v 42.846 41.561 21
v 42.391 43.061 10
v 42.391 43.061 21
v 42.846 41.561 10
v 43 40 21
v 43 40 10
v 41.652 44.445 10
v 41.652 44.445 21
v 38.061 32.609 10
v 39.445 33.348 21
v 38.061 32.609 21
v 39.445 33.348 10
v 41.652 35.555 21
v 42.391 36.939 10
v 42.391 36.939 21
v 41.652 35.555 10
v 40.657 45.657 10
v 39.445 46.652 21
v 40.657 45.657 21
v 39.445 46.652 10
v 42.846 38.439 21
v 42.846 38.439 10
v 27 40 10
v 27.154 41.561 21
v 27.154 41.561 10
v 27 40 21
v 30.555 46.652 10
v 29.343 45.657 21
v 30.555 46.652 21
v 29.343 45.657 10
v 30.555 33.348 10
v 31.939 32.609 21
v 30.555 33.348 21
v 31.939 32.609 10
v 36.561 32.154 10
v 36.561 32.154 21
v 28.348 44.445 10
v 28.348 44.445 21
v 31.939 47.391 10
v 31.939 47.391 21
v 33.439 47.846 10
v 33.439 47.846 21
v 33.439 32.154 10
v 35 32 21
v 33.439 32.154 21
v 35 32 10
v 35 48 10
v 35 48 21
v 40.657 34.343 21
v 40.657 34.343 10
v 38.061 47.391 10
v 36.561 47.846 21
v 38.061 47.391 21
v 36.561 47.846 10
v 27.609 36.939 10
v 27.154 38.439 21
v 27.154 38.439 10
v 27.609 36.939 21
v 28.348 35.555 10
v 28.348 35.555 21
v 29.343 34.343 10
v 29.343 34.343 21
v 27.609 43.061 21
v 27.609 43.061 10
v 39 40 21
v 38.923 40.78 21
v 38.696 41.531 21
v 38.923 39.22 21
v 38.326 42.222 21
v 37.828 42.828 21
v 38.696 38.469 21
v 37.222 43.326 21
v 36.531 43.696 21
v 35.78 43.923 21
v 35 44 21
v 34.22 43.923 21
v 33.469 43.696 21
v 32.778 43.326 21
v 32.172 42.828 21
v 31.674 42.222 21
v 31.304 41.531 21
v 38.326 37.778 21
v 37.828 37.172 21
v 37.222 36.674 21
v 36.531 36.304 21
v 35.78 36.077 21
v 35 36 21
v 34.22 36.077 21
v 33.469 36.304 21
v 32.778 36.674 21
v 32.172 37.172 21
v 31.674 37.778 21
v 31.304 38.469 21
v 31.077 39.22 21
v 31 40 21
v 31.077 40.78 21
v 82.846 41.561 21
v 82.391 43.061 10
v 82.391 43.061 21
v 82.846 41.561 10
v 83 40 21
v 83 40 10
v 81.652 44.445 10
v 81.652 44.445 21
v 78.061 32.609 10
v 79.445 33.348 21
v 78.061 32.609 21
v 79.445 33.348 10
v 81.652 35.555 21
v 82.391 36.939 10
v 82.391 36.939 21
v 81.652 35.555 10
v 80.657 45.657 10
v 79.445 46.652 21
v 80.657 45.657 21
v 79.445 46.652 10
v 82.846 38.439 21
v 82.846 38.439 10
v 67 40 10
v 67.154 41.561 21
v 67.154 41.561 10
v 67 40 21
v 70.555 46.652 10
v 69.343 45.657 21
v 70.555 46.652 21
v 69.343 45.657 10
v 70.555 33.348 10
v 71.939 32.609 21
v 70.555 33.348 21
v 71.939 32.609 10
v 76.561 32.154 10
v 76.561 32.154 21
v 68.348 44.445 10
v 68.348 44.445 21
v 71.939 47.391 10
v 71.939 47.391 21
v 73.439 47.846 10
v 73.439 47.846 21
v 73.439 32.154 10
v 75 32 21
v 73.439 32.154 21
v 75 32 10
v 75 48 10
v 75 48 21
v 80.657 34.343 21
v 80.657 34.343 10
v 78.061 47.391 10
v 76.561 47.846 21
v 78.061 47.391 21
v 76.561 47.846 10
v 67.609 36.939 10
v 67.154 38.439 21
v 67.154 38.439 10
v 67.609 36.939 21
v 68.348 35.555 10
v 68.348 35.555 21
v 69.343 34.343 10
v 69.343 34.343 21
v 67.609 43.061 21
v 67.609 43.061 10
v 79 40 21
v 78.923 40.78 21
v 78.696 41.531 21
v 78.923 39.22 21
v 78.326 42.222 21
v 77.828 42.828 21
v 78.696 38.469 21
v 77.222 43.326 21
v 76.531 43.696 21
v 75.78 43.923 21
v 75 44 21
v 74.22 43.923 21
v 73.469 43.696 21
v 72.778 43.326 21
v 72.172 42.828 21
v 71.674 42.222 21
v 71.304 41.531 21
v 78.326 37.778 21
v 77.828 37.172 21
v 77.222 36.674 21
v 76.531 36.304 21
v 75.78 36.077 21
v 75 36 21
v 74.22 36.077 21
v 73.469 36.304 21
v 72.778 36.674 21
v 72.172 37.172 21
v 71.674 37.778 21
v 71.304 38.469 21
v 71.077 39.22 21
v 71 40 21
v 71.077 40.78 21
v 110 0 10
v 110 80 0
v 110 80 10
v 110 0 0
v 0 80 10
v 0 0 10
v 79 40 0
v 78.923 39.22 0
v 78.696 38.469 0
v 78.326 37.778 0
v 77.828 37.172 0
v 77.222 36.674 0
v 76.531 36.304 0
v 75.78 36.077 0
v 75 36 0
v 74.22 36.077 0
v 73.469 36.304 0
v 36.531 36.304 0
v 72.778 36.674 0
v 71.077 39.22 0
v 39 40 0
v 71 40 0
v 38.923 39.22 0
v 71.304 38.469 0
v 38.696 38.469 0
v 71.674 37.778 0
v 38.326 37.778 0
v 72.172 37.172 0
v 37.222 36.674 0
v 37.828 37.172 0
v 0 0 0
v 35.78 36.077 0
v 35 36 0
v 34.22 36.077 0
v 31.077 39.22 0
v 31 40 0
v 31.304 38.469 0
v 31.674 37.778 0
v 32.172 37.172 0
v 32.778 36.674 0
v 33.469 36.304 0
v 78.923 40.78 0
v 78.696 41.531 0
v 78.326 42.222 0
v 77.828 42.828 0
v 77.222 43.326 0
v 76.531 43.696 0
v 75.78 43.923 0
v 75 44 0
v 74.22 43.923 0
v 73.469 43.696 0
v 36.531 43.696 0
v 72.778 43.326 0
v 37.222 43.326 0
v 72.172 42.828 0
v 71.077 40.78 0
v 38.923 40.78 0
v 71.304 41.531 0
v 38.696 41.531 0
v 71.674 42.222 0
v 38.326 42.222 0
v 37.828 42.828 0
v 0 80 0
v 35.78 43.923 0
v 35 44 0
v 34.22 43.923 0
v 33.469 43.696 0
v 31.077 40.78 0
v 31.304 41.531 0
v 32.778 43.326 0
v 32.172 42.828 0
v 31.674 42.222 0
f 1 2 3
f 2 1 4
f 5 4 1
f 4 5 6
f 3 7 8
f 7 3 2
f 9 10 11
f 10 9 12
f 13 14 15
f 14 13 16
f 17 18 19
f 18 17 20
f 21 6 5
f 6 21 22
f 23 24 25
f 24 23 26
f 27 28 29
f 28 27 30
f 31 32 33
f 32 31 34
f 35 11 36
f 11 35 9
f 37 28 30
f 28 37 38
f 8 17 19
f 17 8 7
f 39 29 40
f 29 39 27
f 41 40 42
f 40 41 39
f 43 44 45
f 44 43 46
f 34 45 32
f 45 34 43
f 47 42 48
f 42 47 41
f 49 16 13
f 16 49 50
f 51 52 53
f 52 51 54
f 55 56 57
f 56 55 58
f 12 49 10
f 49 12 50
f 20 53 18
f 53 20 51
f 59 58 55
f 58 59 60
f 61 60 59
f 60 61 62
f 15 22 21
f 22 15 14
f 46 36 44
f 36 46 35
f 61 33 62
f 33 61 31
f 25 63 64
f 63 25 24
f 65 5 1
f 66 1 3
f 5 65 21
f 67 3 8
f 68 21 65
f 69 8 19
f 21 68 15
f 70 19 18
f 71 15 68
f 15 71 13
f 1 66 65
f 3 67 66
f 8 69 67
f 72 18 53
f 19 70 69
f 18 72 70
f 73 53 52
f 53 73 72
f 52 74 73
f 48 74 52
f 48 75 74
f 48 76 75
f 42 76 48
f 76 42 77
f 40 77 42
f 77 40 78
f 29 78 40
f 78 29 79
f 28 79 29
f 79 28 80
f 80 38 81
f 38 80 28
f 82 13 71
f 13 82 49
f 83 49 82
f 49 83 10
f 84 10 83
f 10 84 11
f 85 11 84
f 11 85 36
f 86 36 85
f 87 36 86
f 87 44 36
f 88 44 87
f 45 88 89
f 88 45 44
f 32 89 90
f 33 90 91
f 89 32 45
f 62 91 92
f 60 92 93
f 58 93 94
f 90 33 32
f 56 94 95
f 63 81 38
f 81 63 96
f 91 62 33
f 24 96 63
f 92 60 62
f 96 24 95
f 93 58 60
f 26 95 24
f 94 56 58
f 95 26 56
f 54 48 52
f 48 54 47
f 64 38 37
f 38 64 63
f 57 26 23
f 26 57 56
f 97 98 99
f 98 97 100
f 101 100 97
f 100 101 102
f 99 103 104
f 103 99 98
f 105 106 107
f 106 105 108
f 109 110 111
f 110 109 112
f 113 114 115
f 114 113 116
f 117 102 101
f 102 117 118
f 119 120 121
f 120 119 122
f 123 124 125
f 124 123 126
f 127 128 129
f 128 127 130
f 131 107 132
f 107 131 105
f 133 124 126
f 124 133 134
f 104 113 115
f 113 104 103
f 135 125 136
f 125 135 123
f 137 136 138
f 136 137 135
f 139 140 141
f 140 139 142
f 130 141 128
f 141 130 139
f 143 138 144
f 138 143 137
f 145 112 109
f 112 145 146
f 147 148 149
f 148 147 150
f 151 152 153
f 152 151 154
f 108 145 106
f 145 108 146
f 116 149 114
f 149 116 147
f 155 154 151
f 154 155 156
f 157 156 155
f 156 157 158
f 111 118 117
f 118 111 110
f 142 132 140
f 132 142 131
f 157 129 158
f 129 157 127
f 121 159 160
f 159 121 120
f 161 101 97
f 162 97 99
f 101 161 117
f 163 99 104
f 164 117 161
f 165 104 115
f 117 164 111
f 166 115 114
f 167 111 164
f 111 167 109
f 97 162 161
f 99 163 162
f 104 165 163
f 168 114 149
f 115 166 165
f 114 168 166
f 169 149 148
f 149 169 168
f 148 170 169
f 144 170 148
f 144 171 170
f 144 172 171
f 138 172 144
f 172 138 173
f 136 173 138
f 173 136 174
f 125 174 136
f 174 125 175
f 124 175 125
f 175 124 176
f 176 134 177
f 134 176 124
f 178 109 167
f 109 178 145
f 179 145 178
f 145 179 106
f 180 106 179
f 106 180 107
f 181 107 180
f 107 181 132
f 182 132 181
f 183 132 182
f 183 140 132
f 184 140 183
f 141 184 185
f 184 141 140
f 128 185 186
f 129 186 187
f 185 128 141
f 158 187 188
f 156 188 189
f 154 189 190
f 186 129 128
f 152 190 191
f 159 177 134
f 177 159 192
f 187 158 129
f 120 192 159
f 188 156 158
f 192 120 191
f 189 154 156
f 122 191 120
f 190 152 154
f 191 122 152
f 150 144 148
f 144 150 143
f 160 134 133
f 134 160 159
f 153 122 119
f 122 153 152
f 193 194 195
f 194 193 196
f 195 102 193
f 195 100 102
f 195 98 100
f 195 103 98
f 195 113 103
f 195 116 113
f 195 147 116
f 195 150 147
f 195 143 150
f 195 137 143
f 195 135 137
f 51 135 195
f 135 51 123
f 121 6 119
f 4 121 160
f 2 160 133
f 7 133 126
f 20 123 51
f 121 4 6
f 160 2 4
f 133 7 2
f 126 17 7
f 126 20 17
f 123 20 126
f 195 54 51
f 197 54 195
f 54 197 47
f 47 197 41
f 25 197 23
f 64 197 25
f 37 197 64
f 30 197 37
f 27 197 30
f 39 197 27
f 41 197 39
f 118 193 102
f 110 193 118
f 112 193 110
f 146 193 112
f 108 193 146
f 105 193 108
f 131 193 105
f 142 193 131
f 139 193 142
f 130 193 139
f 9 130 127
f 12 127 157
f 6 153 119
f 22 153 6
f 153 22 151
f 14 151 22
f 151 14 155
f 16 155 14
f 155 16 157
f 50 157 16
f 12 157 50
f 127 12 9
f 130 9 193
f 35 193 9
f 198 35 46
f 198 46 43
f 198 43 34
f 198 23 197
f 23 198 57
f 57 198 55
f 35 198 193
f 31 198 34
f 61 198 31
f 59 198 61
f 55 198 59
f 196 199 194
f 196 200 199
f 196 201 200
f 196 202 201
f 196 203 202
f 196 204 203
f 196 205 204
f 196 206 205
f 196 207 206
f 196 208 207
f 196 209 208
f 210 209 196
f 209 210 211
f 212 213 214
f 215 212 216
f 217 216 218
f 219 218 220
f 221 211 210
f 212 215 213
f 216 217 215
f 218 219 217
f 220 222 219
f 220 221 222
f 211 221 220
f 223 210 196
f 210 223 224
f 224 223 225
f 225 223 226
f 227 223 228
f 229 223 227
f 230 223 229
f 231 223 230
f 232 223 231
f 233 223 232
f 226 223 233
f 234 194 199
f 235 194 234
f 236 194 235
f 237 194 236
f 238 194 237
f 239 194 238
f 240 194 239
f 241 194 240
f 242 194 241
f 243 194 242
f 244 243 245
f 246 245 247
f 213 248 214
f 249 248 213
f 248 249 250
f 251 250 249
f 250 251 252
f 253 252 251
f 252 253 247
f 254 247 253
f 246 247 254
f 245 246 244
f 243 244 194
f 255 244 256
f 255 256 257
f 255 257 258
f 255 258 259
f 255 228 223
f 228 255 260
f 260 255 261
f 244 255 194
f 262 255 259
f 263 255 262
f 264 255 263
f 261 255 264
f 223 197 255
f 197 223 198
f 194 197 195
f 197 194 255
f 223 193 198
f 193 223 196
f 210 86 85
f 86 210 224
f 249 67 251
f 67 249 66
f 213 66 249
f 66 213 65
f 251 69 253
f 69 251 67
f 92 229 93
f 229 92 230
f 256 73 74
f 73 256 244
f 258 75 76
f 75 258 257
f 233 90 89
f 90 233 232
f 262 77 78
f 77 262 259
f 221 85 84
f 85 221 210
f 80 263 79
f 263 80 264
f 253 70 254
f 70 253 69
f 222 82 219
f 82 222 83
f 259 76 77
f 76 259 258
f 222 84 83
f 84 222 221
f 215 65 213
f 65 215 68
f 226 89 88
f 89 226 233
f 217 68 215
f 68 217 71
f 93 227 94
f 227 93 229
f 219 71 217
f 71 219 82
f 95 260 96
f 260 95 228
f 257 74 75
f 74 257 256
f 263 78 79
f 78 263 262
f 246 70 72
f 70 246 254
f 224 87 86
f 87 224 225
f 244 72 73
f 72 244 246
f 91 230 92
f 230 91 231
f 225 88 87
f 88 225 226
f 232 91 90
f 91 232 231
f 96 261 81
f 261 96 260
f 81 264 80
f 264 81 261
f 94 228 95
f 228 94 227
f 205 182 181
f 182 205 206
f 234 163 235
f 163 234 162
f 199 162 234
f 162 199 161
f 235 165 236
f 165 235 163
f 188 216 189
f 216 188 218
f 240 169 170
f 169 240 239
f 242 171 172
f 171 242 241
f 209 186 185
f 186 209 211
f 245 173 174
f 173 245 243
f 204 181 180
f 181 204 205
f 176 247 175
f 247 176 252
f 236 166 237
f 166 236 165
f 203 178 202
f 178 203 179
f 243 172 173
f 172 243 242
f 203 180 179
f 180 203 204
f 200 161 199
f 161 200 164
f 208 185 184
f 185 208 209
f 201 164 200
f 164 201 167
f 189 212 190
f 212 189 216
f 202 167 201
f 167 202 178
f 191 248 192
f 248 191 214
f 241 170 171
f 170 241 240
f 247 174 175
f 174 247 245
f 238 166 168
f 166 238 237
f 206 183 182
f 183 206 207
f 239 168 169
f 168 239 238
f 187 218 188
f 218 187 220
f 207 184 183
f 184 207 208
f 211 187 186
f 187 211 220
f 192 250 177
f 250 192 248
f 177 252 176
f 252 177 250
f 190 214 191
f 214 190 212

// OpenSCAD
$fn = 32;

// ----------------------------------------------------------------------
// Drill jig: two_boss jig
// ----------------------------------------------------------------------

// --- parameters (mm) ---
plate_l = 110;            // plate length, X
plate_w = 80;             // plate width, Y
plate_t = 10;             // plate thickness
boss_d = 16;              // guide boss diameter
boss_h = 12;              // boss height above the plate
guide_d = 8;              // guide hole diameter
boss_pitch = 40;          // boss pitch

n_boss = 2;  // guide bosses
boss_x0 = (plate_l - (n_boss - 1) * boss_pitch) / 2;  // first boss X
boss_top = plate_t - 1 + boss_h;  // boss crown height
total_h = boss_top;  // overall height

difference() {
  union() {
  cube([plate_l, plate_w, plate_t]);
  for (i = [0 : n_boss - 1])
    translate([boss_x0 + i * boss_pitch, plate_w / 2, plate_t - 1])
      cylinder(h = boss_h, d = boss_d);
  }
  for (i = [0 : n_boss - 1])
    translate([boss_x0 + i * boss_pitch, plate_w / 2, -1])
      cylinder(h = plate_t + boss_h, d = guide_d);
}
